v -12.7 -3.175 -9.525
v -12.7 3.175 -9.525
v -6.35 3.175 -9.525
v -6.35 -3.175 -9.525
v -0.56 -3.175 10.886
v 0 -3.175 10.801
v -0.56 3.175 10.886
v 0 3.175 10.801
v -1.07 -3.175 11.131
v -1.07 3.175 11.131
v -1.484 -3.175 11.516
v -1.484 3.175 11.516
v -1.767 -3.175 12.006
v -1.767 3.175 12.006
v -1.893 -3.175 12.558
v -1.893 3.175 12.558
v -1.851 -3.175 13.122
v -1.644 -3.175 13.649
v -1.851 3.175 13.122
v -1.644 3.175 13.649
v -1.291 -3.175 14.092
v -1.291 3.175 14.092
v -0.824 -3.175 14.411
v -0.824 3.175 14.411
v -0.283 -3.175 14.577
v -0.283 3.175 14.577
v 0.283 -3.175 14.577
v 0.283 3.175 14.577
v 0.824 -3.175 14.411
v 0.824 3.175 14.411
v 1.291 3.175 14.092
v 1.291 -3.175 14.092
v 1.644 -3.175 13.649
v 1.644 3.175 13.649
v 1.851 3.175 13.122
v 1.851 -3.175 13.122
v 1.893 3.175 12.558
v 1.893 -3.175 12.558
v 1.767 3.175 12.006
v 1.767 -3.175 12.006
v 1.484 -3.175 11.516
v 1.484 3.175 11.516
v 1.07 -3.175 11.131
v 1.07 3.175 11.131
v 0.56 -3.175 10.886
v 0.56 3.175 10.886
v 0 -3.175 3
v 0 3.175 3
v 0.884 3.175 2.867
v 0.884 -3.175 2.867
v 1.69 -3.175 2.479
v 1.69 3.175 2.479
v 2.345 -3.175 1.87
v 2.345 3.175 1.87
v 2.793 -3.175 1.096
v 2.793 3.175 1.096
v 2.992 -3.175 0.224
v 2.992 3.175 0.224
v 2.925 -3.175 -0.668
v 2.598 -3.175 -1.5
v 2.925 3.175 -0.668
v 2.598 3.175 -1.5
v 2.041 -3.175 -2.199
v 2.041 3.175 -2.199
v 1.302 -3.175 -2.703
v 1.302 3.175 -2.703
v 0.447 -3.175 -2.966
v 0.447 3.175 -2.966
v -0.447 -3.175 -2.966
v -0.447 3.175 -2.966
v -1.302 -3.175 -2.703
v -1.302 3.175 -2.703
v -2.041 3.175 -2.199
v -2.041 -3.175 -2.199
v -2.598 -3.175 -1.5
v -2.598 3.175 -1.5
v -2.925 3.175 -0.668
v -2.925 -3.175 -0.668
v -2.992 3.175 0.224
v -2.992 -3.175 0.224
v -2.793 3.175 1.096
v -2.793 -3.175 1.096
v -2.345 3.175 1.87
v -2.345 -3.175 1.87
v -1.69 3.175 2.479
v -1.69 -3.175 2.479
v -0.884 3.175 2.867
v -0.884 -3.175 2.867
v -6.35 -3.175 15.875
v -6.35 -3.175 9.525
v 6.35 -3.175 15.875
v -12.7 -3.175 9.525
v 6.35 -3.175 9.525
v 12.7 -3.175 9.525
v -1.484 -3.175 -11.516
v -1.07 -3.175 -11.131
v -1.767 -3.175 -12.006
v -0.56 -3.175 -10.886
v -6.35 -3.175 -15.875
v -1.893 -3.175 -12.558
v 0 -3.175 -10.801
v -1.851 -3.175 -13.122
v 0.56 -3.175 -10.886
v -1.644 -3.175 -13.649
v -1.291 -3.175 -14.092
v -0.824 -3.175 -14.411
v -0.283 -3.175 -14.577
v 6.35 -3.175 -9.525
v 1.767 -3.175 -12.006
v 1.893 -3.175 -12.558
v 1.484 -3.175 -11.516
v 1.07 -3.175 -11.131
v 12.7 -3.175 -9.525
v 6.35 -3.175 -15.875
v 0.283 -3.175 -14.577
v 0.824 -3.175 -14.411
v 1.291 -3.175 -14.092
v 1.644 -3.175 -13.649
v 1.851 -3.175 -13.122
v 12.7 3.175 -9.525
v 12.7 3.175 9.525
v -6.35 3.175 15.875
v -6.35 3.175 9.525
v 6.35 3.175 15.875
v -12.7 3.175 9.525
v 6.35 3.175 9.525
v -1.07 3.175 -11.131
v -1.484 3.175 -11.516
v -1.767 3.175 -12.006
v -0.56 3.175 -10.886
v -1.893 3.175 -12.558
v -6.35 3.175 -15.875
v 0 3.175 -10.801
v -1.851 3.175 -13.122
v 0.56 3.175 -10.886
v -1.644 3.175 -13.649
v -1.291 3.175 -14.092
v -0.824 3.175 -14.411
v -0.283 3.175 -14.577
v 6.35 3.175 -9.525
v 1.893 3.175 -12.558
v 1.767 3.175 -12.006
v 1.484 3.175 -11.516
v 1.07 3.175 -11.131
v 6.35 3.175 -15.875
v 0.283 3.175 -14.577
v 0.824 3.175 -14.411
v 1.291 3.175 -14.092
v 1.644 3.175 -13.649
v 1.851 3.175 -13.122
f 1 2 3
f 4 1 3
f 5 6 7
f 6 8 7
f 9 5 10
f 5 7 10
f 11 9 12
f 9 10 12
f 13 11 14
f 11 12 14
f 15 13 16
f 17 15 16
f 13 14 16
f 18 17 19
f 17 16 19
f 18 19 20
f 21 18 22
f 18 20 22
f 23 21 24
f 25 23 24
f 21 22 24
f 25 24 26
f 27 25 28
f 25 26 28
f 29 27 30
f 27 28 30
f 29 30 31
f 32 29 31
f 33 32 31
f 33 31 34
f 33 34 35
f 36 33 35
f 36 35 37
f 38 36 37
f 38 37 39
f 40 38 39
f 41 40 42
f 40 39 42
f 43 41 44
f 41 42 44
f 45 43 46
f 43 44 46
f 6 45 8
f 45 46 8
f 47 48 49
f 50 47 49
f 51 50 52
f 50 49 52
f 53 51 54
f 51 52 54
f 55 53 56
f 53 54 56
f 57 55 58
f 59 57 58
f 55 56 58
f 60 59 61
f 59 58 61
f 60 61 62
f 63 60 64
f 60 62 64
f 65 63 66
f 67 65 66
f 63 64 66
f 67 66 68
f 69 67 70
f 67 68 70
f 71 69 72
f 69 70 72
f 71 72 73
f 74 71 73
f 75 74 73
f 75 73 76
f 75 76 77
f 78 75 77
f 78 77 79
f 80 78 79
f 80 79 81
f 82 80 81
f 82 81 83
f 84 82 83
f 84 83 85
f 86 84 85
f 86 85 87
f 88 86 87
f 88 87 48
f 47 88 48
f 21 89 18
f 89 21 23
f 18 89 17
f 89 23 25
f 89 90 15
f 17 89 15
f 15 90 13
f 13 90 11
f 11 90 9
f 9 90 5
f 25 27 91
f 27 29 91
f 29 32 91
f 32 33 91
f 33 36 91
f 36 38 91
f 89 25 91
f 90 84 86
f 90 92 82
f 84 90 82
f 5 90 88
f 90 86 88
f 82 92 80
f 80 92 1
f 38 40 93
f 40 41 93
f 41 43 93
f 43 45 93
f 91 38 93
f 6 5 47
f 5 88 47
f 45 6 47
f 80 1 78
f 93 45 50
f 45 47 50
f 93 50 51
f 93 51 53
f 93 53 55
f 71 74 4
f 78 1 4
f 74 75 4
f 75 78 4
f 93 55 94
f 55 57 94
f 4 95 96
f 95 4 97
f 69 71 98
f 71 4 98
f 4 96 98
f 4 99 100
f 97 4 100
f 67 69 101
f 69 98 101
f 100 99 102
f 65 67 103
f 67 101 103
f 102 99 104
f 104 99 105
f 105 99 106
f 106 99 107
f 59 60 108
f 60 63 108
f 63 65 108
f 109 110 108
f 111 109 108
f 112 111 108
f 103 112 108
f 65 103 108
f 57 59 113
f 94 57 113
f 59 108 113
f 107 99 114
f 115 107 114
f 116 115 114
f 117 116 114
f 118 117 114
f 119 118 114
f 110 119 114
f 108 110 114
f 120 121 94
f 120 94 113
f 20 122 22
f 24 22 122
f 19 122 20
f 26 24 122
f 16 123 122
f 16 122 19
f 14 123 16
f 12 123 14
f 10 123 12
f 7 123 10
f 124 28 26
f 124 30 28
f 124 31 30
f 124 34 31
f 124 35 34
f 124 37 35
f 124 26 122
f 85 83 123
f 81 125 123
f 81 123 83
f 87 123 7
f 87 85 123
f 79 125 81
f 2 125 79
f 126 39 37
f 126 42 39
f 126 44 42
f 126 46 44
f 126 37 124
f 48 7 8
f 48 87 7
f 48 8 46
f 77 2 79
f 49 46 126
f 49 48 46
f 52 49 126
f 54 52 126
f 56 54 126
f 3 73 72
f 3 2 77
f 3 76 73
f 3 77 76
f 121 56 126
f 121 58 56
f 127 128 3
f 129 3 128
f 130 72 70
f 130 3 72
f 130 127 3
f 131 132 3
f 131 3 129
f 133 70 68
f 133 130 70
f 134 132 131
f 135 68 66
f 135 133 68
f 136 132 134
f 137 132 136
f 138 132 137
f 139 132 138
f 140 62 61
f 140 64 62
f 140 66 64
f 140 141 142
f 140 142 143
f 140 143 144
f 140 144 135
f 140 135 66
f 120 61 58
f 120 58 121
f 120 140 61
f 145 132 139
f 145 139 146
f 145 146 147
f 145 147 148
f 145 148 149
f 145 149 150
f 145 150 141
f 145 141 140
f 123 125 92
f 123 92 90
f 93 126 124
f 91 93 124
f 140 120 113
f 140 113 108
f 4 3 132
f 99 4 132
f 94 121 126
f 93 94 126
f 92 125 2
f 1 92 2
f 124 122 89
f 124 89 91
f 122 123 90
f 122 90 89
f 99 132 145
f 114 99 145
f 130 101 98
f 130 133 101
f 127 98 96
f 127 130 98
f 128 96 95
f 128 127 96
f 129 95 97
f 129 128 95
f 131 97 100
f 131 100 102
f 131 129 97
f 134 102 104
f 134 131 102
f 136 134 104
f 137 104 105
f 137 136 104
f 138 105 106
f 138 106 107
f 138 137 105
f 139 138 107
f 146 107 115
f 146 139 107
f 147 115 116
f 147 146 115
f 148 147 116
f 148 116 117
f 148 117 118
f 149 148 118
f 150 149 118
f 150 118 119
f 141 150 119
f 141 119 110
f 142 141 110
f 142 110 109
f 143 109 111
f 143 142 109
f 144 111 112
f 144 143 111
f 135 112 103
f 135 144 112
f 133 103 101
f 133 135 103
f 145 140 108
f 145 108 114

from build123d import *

# Parameters (mm, degrees)
SKETCH1_W               = 25.4
SKETCH1_H               = 31.75
BOSS_EXTRUDE1_DEPTH     = 3.175
CUT_EXTRUDE1_REACH      = 23.299
SKETCH2_W               = 6.35
SKETCH2_H               = 6.35
MIRROR2_COPY_1_REACH    = 23.299
MIRROR2_COPY_1_SKETCH_W = 6.35
MIRROR2_COPY_1_SKETCH_H = 6.35
CUT_EXTRUDE2_REACH      = 23.299
SKETCH5_R               = 3


with BuildPart() as part:
    # Sketch1 → Boss-Extrude1 (new, symmetric)
    with BuildSketch(Plane(origin=(0, 0, 0), x_dir=(1, 0, 0), z_dir=(0, 1, 0))):
        Rectangle(SKETCH1_W, SKETCH1_H)
    extrude(amount=BOSS_EXTRUDE1_DEPTH, both=True)

    # Sketch2 → Cut-Extrude1 (cut, up to next)
    with BuildSketch(Plane(origin=(0, 3.175, 0), x_dir=(1, 0, 0), z_dir=(0, 1, 0)), mode=Mode.PRIVATE) as cut_extrude1_sk1:
        with Locations((-9.525, 12.7)):
            Rectangle(SKETCH2_W, SKETCH2_H)
    cut_extrude1_tool1 = extrude(cut_extrude1_sk1.sketch, amount=-CUT_EXTRUDE1_REACH, mode=Mode.PRIVATE) & part.part
    cut_extrude1 = cut_extrude1_tool1.solids().sort_by_distance((-9.525, 3.175, -12.7))[0]
    add(cut_extrude1, mode=Mode.SUBTRACT)

    # Mirror1: Cut-Extrude1 across plane
    add(cut_extrude1.mirror(Plane.XY), mode=Mode.SUBTRACT)

    # Mirror2: Cut-Extrude1 across plane
    add(cut_extrude1.mirror(Plane(origin=(0, 0, 0), x_dir=(0, 0, 1), z_dir=(1, 0, 0))), mode=Mode.SUBTRACT)

    # Mirror2 copy 1 sketch → Mirror2 copy 1 (cut, up to next)
    with BuildSketch(Plane(origin=(0, 3.175, 0), x_dir=(-1, 0, 0), z_dir=(0, 1, 0)), mode=Mode.PRIVATE) as mirror2_copy_1_sk1:
        with Locations((-9.525, 12.7)):
            Rectangle(MIRROR2_COPY_1_SKETCH_W, MIRROR2_COPY_1_SKETCH_H)
    mirror2_copy_1_tool1 = extrude(mirror2_copy_1_sk1.sketch, amount=-MIRROR2_COPY_1_REACH, mode=Mode.PRIVATE) & part.part
    add(mirror2_copy_1_tool1.solids().sort_by_distance((9.525, 3.175, 12.7))[0], mode=Mode.SUBTRACT)

    # Sketch3 → #6 Clearance Hole1 (revolve, cut)
    with BuildSketch(Plane(origin=(0, 3.175, -12.7), x_dir=(0, 0, 1), z_dir=(1, 0, 0))):
        Polygon((0, 0), (0, 7.490824014), (1.89865, 6.35), (1.89865, 0), align=None)
    f_6_clearance_hole1 = revolve(axis=Axis((0, 9.525, -12.7), (0, -1, 0)), mode=Mode.SUBTRACT)

    # Mirror3: #6 Clearance Hole1 across plane
    add(f_6_clearance_hole1.mirror(Plane.XY), mode=Mode.SUBTRACT)

    # Sketch5 → Cut-Extrude2 (cut, up to next)
    with BuildSketch(Plane(origin=(0, 3.175, 0), x_dir=(1, 0, 0), z_dir=(0, 1, 0)), mode=Mode.PRIVATE) as cut_extrude2_sk1:
        with Locations(Location((0, 0, 0), (0, 0, 270))):
            Circle(SKETCH5_R)
    cut_extrude2_tool1 = extrude(cut_extrude2_sk1.sketch, amount=-CUT_EXTRUDE2_REACH, mode=Mode.PRIVATE) & part.part
    add(cut_extrude2_tool1.solids().sort_by_distance((0, 3.175, 0))[0], mode=Mode.SUBTRACT)


solid = part.part
